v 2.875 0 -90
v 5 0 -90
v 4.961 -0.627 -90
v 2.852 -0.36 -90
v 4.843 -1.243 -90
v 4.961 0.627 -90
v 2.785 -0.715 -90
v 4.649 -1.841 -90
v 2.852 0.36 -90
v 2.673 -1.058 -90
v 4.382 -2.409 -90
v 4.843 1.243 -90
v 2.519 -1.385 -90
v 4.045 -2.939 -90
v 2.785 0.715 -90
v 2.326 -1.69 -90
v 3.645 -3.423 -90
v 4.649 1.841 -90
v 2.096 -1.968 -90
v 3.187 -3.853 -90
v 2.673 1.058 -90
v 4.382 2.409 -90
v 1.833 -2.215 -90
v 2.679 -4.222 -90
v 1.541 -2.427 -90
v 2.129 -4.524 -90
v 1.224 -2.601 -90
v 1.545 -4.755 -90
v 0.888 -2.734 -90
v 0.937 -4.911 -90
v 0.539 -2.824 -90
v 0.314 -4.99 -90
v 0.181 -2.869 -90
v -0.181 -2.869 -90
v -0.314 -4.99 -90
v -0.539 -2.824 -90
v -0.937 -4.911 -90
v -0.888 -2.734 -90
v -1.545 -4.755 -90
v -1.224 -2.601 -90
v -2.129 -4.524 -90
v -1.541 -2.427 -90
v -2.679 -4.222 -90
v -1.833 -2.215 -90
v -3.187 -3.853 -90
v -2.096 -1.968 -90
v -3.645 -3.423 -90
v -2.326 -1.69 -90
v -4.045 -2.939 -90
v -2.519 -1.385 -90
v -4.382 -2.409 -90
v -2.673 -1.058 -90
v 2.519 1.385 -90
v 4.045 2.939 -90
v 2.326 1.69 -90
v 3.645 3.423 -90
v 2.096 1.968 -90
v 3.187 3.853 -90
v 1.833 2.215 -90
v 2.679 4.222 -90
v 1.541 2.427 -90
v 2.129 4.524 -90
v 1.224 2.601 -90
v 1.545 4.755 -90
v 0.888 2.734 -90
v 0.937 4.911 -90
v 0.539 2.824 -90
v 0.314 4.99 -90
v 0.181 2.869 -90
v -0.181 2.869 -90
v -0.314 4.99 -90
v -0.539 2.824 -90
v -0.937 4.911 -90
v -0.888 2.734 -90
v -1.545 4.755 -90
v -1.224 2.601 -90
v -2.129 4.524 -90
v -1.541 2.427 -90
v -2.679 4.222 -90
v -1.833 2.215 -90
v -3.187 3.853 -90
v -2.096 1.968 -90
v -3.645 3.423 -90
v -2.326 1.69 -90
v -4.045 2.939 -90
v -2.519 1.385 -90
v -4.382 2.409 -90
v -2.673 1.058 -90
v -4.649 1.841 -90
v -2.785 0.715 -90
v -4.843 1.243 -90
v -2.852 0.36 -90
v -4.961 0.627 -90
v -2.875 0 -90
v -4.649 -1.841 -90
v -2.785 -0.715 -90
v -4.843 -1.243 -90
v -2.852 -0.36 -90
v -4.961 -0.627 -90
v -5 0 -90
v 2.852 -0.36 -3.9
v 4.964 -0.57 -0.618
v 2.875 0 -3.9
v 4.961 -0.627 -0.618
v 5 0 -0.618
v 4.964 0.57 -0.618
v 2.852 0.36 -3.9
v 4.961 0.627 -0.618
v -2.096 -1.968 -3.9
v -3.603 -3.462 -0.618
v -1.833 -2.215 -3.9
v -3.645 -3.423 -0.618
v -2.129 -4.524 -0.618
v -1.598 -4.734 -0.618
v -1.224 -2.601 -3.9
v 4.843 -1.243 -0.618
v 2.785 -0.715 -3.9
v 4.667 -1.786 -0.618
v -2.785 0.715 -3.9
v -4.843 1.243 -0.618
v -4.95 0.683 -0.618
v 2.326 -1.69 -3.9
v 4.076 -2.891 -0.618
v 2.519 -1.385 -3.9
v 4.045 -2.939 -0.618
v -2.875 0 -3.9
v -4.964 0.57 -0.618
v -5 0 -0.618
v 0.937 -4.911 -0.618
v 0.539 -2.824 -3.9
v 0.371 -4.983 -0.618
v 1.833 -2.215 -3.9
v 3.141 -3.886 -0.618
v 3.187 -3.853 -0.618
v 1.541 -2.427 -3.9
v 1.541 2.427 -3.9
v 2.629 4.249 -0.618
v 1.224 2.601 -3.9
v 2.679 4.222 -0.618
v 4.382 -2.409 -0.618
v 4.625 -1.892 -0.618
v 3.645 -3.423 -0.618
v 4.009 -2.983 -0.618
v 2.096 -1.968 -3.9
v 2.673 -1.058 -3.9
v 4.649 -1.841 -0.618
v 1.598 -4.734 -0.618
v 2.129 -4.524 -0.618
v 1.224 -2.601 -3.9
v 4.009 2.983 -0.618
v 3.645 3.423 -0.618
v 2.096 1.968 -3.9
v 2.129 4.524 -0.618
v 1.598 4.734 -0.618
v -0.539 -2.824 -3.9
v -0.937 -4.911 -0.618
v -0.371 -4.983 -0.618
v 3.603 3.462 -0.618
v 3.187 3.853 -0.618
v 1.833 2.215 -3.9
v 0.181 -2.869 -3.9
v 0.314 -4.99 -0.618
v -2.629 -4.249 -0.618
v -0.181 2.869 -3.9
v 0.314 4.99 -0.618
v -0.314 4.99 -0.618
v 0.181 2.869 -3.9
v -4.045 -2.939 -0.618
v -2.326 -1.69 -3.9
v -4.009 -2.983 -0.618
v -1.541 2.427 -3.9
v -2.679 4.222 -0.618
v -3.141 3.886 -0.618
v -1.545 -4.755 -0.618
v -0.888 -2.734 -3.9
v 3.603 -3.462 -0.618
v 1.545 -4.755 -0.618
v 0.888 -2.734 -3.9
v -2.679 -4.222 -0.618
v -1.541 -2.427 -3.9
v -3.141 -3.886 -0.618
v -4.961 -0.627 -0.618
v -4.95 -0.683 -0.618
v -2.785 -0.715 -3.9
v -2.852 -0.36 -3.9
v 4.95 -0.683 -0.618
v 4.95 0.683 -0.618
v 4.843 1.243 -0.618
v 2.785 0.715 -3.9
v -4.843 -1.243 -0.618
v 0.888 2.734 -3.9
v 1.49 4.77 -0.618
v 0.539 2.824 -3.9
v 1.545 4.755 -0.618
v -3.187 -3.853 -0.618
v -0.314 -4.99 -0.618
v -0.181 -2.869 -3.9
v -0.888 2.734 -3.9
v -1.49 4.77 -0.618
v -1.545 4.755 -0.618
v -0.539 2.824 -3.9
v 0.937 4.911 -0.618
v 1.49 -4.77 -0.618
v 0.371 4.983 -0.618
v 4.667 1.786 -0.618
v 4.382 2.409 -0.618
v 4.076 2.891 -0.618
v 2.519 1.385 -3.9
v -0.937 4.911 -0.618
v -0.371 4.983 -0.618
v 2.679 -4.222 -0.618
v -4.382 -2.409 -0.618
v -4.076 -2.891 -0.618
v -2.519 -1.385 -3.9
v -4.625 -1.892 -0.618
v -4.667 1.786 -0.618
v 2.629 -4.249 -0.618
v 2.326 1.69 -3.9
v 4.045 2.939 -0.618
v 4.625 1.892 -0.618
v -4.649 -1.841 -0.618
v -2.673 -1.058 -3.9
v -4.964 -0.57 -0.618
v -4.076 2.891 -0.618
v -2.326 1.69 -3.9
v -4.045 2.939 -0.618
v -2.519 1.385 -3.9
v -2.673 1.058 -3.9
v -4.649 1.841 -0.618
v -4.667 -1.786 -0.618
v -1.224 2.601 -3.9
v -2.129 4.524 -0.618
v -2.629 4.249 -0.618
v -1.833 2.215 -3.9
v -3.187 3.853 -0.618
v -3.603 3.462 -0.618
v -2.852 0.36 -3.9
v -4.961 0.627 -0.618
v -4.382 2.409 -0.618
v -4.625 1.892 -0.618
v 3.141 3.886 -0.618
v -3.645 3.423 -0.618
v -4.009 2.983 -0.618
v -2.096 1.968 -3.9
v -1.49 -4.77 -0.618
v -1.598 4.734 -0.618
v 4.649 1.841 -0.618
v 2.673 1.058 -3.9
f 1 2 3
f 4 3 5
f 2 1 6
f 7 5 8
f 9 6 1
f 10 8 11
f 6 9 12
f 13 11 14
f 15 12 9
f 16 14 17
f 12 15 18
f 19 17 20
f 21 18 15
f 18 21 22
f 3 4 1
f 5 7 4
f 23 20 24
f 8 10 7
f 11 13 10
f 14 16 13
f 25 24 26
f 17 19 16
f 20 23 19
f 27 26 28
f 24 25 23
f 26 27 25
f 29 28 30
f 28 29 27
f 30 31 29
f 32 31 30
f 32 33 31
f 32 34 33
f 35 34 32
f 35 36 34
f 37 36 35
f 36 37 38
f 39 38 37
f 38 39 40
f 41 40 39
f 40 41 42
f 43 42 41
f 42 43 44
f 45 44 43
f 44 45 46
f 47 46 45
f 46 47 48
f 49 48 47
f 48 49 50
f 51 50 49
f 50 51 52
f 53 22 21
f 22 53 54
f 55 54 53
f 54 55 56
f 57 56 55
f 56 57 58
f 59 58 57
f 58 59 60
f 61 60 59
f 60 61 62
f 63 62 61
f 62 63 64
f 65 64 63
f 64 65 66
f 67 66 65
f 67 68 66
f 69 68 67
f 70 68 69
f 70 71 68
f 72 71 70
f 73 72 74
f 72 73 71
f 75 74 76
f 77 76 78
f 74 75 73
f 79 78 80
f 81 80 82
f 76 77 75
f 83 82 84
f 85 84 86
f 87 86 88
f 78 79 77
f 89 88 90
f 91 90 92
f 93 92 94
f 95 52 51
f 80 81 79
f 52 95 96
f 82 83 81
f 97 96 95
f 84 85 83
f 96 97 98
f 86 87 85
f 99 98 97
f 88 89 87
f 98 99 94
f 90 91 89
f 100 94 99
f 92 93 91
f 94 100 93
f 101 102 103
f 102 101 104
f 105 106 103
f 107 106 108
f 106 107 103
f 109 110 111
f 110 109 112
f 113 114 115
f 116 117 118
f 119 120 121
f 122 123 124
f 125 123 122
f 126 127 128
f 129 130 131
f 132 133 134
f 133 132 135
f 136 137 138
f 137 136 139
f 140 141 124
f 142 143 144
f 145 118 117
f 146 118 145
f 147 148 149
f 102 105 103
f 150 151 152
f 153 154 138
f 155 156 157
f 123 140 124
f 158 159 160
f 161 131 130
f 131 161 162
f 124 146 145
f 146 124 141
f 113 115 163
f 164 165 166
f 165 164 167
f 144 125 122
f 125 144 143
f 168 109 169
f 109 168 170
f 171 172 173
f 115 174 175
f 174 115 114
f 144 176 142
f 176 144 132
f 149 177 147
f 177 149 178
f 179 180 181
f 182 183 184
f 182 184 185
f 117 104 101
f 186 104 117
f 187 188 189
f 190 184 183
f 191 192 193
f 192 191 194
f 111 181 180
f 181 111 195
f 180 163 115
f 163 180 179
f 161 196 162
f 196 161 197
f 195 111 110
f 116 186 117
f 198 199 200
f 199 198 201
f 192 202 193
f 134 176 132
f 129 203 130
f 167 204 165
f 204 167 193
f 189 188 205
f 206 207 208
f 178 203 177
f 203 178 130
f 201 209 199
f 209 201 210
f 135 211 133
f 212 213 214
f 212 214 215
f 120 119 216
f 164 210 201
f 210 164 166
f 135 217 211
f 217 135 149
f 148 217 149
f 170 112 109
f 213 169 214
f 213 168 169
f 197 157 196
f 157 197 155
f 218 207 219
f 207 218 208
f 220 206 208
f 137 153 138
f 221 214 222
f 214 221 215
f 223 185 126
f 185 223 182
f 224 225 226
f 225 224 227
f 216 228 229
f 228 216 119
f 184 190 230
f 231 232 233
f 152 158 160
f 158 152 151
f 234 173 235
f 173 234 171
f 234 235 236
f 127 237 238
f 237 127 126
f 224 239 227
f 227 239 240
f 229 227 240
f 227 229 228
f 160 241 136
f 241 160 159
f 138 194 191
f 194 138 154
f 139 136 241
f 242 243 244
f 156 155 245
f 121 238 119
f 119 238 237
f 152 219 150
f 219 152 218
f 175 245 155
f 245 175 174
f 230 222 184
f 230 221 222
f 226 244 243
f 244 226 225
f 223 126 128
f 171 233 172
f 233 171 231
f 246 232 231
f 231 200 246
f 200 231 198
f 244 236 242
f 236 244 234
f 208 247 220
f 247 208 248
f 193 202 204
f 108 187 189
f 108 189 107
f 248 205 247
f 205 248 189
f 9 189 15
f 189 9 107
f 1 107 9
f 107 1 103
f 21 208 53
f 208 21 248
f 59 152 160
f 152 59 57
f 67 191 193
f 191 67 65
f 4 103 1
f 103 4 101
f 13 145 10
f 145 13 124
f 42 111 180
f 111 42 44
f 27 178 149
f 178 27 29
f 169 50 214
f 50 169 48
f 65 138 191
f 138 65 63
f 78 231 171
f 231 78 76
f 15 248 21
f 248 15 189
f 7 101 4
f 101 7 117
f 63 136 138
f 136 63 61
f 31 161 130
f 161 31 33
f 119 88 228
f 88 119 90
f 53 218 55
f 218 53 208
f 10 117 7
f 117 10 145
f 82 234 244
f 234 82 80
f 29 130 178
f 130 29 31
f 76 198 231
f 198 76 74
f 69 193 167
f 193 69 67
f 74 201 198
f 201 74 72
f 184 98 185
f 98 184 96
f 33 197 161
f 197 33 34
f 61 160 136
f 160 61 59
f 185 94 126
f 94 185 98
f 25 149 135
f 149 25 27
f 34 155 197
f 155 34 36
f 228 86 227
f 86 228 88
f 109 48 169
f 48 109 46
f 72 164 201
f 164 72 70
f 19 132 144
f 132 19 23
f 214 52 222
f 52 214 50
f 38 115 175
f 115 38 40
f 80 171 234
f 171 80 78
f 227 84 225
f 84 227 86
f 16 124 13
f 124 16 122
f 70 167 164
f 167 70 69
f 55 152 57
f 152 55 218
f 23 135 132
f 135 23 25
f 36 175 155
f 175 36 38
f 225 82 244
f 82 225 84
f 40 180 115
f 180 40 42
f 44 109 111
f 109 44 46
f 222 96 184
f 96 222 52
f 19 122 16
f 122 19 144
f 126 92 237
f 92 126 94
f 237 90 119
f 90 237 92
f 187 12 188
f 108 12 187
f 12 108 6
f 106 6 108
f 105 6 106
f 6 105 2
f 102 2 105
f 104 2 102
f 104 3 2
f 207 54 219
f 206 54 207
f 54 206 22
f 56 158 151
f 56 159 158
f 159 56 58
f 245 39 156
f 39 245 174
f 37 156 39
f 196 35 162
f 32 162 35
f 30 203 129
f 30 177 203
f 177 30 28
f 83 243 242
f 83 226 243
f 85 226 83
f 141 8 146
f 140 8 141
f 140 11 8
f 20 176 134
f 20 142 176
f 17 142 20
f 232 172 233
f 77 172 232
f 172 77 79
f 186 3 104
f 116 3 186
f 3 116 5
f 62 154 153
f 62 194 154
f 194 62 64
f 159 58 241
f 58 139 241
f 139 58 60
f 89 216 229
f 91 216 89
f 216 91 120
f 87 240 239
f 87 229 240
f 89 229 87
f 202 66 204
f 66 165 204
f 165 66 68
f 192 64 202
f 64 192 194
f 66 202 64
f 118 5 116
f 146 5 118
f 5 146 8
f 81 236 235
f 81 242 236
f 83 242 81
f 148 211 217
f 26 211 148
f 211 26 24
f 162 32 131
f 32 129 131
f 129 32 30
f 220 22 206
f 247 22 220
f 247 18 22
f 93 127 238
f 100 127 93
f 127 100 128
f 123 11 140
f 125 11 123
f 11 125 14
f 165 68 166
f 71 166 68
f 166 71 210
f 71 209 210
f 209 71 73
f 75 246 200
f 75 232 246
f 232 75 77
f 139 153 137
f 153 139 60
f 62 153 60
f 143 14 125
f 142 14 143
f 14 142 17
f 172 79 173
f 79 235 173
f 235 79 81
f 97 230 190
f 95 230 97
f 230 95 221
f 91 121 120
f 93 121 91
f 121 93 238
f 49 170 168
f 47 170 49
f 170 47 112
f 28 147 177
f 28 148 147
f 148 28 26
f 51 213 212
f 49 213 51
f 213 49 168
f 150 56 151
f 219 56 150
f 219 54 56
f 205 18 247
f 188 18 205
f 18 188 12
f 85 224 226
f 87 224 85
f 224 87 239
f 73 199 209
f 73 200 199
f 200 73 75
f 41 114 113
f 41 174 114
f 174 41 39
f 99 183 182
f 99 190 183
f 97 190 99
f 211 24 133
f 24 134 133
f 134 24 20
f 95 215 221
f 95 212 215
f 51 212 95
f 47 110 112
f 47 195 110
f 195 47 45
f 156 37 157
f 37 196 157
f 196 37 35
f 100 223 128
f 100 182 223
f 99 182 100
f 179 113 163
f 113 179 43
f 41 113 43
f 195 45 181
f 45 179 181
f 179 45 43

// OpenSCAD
$fn = 50;


difference() {
	union() {
		translate(v = [0, 0, -90.0000000000]) {
			cylinder(h = 90, r = 5.0000000000);
		}
		cylinder(h = 0, r = 8.0000000000);
	}
	union() {
		translate(v = [0, 0, 0]) {
			rotate(a = [0, 0, 0]) {
				difference() {
					union() {
						#translate(v = [0, 0, -90.0000000000]) {
							cylinder(h = 90, r = 2.6000000000);
						}
						#translate(v = [0, 0, -3.9000000000]) {
							cylinder(h = 3.9000000000, r = 5.0000000000, r1 = 2.8750000000, r2 = 5.4000000000);
						}
						#translate(v = [0, 0, -90.0000000000]) {
							cylinder(h = 90, r = 2.8750000000);
						}
						#translate(v = [0, 0, -90.0000000000]) {
							cylinder(h = 90, r = 2.6000000000);
						}
					}
					union();
				}
			}
		}
	}
}
